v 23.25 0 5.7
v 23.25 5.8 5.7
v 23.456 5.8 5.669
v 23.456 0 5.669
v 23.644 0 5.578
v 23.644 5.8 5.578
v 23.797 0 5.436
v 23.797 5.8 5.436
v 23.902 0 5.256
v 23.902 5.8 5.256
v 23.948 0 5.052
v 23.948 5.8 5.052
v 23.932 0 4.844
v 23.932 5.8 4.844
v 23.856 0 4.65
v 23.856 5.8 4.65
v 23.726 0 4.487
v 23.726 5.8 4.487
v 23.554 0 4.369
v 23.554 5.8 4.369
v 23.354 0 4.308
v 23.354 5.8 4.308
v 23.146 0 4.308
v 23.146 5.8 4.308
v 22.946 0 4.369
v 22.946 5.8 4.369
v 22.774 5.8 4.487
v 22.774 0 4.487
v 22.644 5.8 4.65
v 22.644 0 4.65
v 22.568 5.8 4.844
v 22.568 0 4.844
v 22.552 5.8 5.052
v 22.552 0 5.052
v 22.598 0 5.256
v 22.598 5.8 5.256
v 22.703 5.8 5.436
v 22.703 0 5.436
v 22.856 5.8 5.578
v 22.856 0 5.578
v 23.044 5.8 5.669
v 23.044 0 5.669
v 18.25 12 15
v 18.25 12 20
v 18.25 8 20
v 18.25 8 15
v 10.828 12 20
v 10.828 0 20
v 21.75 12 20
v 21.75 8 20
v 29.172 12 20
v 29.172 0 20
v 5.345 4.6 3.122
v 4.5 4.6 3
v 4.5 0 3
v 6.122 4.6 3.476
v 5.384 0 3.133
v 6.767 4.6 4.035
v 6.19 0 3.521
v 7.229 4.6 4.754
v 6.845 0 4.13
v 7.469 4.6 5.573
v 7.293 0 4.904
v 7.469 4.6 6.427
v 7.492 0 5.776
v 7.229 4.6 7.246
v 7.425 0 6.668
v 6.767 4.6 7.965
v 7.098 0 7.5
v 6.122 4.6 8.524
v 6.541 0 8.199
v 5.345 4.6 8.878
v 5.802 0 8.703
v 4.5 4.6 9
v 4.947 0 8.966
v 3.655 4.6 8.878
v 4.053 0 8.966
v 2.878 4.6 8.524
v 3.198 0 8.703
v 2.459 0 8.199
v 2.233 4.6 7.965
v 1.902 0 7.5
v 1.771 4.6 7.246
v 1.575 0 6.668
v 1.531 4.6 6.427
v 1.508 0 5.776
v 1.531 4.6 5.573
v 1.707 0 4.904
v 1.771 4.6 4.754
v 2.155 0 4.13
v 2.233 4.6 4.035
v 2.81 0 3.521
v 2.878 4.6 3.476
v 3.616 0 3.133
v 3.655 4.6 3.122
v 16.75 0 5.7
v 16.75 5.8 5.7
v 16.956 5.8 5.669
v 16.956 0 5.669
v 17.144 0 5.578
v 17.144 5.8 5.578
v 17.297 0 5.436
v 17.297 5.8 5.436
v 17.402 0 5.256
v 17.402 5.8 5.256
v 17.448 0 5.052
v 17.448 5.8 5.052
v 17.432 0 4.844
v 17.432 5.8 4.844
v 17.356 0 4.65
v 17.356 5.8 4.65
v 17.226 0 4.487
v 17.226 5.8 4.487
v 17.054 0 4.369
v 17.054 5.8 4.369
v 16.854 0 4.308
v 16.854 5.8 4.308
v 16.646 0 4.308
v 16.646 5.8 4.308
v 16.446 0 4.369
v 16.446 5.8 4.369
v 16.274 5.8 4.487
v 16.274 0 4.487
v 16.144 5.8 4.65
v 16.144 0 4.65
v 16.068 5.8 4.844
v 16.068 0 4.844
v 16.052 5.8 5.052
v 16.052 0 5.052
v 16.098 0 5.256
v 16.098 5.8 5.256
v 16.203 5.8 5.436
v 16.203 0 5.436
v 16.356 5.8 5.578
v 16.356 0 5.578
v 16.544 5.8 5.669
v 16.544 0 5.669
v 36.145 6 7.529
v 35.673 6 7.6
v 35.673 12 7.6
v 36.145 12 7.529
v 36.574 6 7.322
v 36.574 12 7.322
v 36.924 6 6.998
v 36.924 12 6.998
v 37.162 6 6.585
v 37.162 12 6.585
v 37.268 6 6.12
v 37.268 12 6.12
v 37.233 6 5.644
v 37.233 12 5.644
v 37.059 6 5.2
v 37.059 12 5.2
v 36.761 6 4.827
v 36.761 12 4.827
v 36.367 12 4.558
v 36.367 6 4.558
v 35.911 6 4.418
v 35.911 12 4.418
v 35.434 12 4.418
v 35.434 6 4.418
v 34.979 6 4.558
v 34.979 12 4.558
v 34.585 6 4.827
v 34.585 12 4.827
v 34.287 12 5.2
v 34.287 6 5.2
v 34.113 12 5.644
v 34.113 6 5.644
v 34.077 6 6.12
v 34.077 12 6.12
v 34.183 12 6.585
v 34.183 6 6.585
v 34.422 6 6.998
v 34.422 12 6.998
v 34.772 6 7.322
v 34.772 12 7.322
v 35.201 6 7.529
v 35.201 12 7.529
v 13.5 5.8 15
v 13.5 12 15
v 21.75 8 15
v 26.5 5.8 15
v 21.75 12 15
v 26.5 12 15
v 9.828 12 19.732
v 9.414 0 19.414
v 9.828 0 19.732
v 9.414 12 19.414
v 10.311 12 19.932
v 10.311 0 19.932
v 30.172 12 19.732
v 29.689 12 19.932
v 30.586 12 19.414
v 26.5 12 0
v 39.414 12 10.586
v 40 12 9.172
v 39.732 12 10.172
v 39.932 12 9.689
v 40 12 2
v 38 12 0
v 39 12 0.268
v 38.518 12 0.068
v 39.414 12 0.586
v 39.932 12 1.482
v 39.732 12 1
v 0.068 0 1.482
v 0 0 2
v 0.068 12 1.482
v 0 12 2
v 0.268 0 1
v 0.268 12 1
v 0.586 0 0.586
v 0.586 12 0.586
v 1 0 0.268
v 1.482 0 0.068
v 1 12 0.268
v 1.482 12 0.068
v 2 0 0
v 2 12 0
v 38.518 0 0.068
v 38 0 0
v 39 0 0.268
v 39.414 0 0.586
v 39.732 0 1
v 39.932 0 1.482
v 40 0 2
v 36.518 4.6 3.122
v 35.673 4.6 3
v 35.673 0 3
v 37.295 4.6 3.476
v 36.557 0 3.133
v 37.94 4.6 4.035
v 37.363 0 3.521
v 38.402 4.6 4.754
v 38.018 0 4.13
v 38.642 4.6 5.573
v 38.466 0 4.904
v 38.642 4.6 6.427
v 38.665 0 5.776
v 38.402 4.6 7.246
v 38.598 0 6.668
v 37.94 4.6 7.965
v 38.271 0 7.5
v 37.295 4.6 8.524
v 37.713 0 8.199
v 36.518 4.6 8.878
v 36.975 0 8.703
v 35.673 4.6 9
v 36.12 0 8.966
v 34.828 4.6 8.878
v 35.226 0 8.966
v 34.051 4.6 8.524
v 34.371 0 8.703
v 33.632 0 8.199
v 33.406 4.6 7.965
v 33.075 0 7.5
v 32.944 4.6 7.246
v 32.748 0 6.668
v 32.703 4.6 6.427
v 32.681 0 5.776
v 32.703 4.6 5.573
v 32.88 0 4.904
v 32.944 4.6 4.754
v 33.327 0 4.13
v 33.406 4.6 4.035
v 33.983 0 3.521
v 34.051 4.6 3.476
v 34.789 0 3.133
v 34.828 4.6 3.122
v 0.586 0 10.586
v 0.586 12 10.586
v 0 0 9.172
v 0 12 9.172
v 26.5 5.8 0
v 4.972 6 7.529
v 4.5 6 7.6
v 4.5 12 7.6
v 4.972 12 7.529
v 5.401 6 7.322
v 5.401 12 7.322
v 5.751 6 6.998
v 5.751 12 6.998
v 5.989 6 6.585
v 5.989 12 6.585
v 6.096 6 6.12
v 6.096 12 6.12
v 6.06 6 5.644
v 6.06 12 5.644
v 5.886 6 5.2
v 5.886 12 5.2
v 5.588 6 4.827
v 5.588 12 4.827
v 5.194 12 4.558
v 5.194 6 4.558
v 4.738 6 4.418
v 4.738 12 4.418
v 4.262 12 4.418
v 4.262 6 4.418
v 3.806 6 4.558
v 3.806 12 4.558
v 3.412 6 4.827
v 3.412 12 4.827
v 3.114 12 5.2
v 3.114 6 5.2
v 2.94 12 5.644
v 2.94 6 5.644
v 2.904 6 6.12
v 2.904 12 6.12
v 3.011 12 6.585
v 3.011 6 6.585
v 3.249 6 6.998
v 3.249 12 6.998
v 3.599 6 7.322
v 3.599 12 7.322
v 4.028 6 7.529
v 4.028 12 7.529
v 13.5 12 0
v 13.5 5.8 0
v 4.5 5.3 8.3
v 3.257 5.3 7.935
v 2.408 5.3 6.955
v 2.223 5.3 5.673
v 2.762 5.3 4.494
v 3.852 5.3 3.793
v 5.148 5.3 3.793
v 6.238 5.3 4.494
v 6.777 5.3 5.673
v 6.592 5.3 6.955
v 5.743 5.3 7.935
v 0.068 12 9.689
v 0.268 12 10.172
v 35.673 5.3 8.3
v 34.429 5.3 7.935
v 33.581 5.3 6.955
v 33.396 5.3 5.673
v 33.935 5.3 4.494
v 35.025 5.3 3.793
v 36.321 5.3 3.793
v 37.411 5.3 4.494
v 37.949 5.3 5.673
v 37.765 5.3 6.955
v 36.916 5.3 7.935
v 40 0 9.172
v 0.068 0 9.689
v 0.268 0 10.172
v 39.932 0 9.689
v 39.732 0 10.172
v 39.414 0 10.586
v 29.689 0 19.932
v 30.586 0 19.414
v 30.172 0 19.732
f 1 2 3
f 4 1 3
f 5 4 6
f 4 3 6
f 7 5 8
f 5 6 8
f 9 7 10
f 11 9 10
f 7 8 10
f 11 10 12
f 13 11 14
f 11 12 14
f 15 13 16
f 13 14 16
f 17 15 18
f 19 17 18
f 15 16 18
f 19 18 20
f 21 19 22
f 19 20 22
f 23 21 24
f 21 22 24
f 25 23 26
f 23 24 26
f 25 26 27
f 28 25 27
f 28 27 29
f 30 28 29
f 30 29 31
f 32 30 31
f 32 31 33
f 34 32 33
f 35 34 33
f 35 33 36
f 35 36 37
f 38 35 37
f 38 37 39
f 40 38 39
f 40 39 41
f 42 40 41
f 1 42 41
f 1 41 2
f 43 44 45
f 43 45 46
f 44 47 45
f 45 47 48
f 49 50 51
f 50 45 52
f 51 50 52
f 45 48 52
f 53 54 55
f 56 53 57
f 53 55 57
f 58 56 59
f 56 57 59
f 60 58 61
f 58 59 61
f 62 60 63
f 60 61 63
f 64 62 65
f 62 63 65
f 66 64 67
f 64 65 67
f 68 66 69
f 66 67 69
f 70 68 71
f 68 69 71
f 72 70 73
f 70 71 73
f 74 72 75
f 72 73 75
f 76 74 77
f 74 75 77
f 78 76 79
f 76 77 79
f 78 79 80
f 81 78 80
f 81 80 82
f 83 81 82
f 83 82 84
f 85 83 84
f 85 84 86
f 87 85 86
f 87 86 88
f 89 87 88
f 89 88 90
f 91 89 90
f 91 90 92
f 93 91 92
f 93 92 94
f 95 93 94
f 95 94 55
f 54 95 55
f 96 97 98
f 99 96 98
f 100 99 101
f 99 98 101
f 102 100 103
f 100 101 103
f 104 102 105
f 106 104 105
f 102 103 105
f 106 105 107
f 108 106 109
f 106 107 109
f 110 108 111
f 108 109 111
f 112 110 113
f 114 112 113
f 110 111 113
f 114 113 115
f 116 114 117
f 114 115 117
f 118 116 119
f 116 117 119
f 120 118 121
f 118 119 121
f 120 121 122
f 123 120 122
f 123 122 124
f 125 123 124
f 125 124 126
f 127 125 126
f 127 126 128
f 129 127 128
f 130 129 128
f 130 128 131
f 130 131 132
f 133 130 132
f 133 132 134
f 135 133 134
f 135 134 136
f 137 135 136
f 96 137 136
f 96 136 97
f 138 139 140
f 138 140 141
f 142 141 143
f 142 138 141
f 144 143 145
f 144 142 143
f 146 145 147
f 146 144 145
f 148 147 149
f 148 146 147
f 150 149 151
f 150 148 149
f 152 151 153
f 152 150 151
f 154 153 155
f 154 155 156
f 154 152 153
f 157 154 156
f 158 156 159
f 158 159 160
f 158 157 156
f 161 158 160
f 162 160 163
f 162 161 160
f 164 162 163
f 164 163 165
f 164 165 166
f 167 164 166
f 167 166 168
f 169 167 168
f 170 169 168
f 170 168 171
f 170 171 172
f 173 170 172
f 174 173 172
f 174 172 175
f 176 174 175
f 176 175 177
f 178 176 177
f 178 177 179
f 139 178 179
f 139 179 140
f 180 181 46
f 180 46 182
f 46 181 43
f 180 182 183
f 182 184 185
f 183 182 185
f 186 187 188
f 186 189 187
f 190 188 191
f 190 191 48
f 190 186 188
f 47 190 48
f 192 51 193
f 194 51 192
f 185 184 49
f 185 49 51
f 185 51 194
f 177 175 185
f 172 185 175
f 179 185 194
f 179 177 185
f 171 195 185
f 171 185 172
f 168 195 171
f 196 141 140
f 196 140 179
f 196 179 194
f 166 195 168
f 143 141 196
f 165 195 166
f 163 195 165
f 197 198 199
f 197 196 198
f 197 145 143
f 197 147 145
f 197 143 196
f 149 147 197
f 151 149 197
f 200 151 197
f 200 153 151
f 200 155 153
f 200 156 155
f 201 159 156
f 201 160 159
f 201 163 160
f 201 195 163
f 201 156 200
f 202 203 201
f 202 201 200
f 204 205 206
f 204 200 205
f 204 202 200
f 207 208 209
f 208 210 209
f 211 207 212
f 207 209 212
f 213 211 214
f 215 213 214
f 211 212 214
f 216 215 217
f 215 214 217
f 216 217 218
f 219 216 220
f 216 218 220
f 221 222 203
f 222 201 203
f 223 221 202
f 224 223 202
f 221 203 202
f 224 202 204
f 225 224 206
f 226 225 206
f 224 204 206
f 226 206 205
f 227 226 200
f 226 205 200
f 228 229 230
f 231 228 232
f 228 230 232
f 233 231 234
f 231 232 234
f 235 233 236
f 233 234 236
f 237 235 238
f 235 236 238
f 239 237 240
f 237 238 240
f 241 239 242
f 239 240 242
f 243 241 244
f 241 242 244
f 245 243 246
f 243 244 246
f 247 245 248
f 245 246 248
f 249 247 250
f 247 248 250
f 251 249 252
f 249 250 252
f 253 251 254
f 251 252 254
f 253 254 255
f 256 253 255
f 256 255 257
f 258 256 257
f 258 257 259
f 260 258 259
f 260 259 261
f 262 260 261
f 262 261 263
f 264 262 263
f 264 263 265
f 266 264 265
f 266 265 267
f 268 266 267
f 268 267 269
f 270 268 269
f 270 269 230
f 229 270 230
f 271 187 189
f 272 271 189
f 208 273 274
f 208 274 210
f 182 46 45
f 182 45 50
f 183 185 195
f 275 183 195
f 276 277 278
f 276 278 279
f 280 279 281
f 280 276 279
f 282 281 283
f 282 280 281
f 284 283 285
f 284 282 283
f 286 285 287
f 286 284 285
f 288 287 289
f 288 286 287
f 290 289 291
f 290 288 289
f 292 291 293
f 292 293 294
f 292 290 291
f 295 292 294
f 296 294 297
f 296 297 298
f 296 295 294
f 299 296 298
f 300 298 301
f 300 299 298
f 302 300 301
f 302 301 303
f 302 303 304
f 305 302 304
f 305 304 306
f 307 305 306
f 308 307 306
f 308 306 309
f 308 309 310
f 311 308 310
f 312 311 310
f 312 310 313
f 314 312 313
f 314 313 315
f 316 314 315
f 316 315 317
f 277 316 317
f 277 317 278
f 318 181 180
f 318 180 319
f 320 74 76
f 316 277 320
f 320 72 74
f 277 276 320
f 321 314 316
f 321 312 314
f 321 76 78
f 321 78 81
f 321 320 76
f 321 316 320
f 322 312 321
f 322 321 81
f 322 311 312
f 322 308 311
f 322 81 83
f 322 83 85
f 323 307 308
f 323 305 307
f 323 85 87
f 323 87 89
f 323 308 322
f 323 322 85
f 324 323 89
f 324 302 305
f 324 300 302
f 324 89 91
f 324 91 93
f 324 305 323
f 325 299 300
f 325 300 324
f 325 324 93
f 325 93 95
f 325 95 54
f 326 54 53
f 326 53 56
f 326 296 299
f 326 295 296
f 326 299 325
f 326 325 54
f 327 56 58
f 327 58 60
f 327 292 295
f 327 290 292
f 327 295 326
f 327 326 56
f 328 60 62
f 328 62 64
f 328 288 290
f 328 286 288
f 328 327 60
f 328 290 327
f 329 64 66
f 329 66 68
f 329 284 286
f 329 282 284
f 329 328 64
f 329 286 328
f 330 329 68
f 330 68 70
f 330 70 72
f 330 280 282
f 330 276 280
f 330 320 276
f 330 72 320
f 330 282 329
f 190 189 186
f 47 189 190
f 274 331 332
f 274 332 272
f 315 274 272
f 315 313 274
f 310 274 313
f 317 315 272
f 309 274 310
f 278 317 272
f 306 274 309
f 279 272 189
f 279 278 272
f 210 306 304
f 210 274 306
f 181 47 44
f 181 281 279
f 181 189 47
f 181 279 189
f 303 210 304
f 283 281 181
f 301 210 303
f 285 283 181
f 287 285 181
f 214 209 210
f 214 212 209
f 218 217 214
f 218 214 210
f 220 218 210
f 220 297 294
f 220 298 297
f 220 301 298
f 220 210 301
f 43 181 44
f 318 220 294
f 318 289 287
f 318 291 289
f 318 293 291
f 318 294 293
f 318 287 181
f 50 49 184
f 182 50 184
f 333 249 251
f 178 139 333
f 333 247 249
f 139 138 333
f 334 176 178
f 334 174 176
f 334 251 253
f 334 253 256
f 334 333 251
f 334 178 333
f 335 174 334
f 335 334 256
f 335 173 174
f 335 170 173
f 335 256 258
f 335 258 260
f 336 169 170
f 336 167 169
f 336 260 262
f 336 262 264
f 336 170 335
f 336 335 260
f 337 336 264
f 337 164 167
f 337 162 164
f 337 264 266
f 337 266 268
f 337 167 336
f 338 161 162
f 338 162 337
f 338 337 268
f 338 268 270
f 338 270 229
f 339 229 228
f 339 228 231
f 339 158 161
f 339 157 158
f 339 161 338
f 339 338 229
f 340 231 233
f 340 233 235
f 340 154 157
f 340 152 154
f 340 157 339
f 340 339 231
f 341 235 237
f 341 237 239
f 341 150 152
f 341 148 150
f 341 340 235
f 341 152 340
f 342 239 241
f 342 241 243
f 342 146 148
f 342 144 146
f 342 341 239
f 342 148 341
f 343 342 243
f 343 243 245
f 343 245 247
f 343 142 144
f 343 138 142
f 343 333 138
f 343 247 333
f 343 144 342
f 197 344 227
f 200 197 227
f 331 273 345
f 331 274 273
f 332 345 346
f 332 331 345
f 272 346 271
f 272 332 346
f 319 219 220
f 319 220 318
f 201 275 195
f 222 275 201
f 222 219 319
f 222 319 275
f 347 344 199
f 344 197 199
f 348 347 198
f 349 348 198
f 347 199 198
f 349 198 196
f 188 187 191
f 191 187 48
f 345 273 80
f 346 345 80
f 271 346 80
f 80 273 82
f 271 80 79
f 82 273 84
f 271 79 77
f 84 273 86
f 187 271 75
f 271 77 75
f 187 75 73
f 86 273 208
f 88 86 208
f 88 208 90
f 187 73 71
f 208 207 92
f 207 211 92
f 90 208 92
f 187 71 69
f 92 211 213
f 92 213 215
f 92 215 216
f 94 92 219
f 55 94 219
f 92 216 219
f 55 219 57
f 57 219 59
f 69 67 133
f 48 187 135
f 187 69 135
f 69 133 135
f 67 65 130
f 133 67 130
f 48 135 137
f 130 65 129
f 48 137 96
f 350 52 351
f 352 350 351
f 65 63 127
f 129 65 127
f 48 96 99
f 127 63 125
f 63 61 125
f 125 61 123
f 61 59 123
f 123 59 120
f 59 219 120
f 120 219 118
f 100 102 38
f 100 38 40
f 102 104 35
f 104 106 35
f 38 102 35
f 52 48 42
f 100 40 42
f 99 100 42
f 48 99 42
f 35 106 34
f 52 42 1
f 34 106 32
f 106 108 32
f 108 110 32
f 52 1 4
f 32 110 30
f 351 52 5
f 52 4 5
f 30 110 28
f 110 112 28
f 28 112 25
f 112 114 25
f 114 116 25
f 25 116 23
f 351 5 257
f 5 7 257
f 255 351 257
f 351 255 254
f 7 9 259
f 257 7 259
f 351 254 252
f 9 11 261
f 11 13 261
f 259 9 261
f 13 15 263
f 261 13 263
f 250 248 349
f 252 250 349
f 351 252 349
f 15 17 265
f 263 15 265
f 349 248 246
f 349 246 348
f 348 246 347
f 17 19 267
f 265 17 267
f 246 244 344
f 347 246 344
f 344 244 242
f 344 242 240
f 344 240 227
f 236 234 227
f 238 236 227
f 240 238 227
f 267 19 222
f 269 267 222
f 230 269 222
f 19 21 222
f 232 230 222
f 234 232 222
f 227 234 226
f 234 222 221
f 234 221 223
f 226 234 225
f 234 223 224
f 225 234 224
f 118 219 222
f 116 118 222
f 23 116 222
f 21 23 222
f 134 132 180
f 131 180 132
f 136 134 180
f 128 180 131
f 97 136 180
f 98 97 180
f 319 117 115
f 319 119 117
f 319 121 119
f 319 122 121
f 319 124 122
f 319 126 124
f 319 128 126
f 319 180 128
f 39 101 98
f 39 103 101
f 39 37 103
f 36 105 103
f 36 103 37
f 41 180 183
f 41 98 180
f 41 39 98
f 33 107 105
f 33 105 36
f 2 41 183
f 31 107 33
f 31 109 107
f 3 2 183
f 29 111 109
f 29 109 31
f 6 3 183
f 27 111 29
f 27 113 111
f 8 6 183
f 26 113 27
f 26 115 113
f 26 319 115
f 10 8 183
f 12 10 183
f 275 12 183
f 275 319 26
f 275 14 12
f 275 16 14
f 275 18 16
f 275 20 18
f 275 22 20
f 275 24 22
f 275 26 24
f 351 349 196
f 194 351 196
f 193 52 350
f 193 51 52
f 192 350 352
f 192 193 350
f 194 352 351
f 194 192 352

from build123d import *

# Parameters (mm, degrees)
SKETCH_1_W          = 40
SKETCH_1_H          = 20
SKETCH_1_R          = 1.6
EXTRUDE_1_DEPTH     = 12
SKETCH_2_W          = 13
SKETCH_2_H          = 15
CUT_EXTRUDE_1_DEPTH = 6.2
SKETCH_3_W          = 3.5
SKETCH_3_H          = 5
CUT_EXTRUDE_2_DEPTH = 4
CHAMFER_1_SIZE      = 10
FILLET_1_R          = 2
SKETCH_4_R          = 0.7
CUT_EXTRUDE_3_DEPTH = 46.149086369
SKETCH_5_R          = 3
CUT_EXTRUDE_4_DEPTH = 4
CHAMFER_2_SIZE      = 2


with BuildPart() as part:
    # 草图1 → 凸台-拉伸1 (new body)
    with BuildSketch(Plane(origin=(0, 0, 0), x_dir=(1, 0, 0), z_dir=(0, 1, 0))):
        with Locations((20, -10)):
            Rectangle(SKETCH_1_W, SKETCH_1_H)
        with Locations(Location((4.5, -6, 0), (0, 0, 270))):
            Circle(SKETCH_1_R, mode=Mode.SUBTRACT)
        with Locations(Location((35.672897196, -6, 0), (0, 0, 270))):
            Circle(SKETCH_1_R, mode=Mode.SUBTRACT)
    extrude(amount=EXTRUDE_1_DEPTH)

    # 草图2 → 切除-拉伸1 (cut)
    with BuildSketch(Plane(origin=(0, 12, 0), x_dir=(1, 0, 0), z_dir=(0, 1, 0))):
        with Locations((20, -7.5)):
            Rectangle(SKETCH_2_W, SKETCH_2_H)
    extrude(amount=-CUT_EXTRUDE_1_DEPTH, mode=Mode.SUBTRACT)

    # 草图3 → 切除-拉伸2 (cut)
    with BuildSketch(Plane(origin=(0, 12, 0), x_dir=(1, 0, 0), z_dir=(0, 1, 0))):
        with Locations((20, -17.5)):
            Rectangle(SKETCH_3_W, SKETCH_3_H)
    extrude(amount=-CUT_EXTRUDE_2_DEPTH, mode=Mode.SUBTRACT)

    # 倒角1
    chamfer_1_edges = [part.edges().sort_by_distance(p)[0] for p in [
        (40, 6, 20),
        (0, 6, 20),
    ]]
    chamfer(chamfer_1_edges, length=CHAMFER_1_SIZE)

    # 圆角1
    fillet_1_edges = [part.edges().sort_by_distance(p)[0] for p in [
        (40, 6, 10),
        (10, 6, 20),
        (30, 6, 20),
        (0, 6, 10),
        (0, 6, 0),
        (40, 6, 0),
    ]]
    fillet(fillet_1_edges, radius=FILLET_1_R)

    # 草图4 → 切除-拉伸3 (cut, through all)
    with BuildSketch(Plane(origin=(0, 5.8, 0), x_dir=(1, 0, 0), z_dir=(0, 1, 0))):
        with Locations(Location((16.75, -5, 0), (0, 0, 270))):
            Circle(SKETCH_4_R)
        with Locations(Location((23.25, -5, 0), (0, 0, 270))):
            Circle(SKETCH_4_R)
    extrude(amount=-CUT_EXTRUDE_3_DEPTH, mode=Mode.SUBTRACT)

    # 草图5 → 切除-拉伸4 (cut)
    with BuildSketch(Plane(origin=(0, 0, 0), x_dir=(-1, 0, 0), z_dir=(0, -1, 0))):
        with Locations(Location((-35.672897196, -6, 0), (0, 0, 90))):
            Circle(SKETCH_5_R)
        with Locations(Location((-4.5, -6, 0), (0, 0, 90))):
            Circle(SKETCH_5_R)
    extrude(amount=-CUT_EXTRUDE_4_DEPTH, mode=Mode.SUBTRACT)

    # 倒角2
    # the kernel refuses this chamfer: 2 mm, written as the material it takes off along each edge
    with BuildSketch(Plane(origin=(35.672897196, 4, 6), x_dir=(0, 0, 1), z_dir=(1, 0, 0))) as chamfer_2_piece_1_section:
        Polygon((1.6 + CHAMFER_2_SIZE, 0), (1.6, -CHAMFER_2_SIZE), (1.6, 0), align=None)
    chamfer_2_piece_1 = revolve(axis=Axis((35.672897196, 4, 6), (0, -1, 0)), mode=Mode.PRIVATE)
    chamfer_2_piece_1 = chamfer_2_piece_1 & Plane(origin=(35.672897196, 5.307163584, 6), x_dir=(0, 0, -1), z_dir=(0, -1, 0)) * Cylinder(3, 15, mode=Mode.PRIVATE)
    add(chamfer_2_piece_1, mode=Mode.SUBTRACT)
    with BuildSketch(Plane(origin=(4.5, 4, 6), x_dir=(0, 0, 1), z_dir=(1, 0, 0))) as chamfer_2_piece_2_section:
        Polygon((1.6 + CHAMFER_2_SIZE, 0), (1.6, -CHAMFER_2_SIZE), (1.6, 0), align=None)
    chamfer_2_piece_2 = revolve(axis=Axis((4.5, 4, 6), (0, -1, 0)), mode=Mode.PRIVATE)
    chamfer_2_piece_2 = chamfer_2_piece_2 & Plane(origin=(4.5, 5.307163584, 6), x_dir=(0, 0, -1), z_dir=(0, -1, 0)) * Cylinder(3, 15, mode=Mode.PRIVATE)
    add(chamfer_2_piece_2, mode=Mode.SUBTRACT)


solid = part.part
